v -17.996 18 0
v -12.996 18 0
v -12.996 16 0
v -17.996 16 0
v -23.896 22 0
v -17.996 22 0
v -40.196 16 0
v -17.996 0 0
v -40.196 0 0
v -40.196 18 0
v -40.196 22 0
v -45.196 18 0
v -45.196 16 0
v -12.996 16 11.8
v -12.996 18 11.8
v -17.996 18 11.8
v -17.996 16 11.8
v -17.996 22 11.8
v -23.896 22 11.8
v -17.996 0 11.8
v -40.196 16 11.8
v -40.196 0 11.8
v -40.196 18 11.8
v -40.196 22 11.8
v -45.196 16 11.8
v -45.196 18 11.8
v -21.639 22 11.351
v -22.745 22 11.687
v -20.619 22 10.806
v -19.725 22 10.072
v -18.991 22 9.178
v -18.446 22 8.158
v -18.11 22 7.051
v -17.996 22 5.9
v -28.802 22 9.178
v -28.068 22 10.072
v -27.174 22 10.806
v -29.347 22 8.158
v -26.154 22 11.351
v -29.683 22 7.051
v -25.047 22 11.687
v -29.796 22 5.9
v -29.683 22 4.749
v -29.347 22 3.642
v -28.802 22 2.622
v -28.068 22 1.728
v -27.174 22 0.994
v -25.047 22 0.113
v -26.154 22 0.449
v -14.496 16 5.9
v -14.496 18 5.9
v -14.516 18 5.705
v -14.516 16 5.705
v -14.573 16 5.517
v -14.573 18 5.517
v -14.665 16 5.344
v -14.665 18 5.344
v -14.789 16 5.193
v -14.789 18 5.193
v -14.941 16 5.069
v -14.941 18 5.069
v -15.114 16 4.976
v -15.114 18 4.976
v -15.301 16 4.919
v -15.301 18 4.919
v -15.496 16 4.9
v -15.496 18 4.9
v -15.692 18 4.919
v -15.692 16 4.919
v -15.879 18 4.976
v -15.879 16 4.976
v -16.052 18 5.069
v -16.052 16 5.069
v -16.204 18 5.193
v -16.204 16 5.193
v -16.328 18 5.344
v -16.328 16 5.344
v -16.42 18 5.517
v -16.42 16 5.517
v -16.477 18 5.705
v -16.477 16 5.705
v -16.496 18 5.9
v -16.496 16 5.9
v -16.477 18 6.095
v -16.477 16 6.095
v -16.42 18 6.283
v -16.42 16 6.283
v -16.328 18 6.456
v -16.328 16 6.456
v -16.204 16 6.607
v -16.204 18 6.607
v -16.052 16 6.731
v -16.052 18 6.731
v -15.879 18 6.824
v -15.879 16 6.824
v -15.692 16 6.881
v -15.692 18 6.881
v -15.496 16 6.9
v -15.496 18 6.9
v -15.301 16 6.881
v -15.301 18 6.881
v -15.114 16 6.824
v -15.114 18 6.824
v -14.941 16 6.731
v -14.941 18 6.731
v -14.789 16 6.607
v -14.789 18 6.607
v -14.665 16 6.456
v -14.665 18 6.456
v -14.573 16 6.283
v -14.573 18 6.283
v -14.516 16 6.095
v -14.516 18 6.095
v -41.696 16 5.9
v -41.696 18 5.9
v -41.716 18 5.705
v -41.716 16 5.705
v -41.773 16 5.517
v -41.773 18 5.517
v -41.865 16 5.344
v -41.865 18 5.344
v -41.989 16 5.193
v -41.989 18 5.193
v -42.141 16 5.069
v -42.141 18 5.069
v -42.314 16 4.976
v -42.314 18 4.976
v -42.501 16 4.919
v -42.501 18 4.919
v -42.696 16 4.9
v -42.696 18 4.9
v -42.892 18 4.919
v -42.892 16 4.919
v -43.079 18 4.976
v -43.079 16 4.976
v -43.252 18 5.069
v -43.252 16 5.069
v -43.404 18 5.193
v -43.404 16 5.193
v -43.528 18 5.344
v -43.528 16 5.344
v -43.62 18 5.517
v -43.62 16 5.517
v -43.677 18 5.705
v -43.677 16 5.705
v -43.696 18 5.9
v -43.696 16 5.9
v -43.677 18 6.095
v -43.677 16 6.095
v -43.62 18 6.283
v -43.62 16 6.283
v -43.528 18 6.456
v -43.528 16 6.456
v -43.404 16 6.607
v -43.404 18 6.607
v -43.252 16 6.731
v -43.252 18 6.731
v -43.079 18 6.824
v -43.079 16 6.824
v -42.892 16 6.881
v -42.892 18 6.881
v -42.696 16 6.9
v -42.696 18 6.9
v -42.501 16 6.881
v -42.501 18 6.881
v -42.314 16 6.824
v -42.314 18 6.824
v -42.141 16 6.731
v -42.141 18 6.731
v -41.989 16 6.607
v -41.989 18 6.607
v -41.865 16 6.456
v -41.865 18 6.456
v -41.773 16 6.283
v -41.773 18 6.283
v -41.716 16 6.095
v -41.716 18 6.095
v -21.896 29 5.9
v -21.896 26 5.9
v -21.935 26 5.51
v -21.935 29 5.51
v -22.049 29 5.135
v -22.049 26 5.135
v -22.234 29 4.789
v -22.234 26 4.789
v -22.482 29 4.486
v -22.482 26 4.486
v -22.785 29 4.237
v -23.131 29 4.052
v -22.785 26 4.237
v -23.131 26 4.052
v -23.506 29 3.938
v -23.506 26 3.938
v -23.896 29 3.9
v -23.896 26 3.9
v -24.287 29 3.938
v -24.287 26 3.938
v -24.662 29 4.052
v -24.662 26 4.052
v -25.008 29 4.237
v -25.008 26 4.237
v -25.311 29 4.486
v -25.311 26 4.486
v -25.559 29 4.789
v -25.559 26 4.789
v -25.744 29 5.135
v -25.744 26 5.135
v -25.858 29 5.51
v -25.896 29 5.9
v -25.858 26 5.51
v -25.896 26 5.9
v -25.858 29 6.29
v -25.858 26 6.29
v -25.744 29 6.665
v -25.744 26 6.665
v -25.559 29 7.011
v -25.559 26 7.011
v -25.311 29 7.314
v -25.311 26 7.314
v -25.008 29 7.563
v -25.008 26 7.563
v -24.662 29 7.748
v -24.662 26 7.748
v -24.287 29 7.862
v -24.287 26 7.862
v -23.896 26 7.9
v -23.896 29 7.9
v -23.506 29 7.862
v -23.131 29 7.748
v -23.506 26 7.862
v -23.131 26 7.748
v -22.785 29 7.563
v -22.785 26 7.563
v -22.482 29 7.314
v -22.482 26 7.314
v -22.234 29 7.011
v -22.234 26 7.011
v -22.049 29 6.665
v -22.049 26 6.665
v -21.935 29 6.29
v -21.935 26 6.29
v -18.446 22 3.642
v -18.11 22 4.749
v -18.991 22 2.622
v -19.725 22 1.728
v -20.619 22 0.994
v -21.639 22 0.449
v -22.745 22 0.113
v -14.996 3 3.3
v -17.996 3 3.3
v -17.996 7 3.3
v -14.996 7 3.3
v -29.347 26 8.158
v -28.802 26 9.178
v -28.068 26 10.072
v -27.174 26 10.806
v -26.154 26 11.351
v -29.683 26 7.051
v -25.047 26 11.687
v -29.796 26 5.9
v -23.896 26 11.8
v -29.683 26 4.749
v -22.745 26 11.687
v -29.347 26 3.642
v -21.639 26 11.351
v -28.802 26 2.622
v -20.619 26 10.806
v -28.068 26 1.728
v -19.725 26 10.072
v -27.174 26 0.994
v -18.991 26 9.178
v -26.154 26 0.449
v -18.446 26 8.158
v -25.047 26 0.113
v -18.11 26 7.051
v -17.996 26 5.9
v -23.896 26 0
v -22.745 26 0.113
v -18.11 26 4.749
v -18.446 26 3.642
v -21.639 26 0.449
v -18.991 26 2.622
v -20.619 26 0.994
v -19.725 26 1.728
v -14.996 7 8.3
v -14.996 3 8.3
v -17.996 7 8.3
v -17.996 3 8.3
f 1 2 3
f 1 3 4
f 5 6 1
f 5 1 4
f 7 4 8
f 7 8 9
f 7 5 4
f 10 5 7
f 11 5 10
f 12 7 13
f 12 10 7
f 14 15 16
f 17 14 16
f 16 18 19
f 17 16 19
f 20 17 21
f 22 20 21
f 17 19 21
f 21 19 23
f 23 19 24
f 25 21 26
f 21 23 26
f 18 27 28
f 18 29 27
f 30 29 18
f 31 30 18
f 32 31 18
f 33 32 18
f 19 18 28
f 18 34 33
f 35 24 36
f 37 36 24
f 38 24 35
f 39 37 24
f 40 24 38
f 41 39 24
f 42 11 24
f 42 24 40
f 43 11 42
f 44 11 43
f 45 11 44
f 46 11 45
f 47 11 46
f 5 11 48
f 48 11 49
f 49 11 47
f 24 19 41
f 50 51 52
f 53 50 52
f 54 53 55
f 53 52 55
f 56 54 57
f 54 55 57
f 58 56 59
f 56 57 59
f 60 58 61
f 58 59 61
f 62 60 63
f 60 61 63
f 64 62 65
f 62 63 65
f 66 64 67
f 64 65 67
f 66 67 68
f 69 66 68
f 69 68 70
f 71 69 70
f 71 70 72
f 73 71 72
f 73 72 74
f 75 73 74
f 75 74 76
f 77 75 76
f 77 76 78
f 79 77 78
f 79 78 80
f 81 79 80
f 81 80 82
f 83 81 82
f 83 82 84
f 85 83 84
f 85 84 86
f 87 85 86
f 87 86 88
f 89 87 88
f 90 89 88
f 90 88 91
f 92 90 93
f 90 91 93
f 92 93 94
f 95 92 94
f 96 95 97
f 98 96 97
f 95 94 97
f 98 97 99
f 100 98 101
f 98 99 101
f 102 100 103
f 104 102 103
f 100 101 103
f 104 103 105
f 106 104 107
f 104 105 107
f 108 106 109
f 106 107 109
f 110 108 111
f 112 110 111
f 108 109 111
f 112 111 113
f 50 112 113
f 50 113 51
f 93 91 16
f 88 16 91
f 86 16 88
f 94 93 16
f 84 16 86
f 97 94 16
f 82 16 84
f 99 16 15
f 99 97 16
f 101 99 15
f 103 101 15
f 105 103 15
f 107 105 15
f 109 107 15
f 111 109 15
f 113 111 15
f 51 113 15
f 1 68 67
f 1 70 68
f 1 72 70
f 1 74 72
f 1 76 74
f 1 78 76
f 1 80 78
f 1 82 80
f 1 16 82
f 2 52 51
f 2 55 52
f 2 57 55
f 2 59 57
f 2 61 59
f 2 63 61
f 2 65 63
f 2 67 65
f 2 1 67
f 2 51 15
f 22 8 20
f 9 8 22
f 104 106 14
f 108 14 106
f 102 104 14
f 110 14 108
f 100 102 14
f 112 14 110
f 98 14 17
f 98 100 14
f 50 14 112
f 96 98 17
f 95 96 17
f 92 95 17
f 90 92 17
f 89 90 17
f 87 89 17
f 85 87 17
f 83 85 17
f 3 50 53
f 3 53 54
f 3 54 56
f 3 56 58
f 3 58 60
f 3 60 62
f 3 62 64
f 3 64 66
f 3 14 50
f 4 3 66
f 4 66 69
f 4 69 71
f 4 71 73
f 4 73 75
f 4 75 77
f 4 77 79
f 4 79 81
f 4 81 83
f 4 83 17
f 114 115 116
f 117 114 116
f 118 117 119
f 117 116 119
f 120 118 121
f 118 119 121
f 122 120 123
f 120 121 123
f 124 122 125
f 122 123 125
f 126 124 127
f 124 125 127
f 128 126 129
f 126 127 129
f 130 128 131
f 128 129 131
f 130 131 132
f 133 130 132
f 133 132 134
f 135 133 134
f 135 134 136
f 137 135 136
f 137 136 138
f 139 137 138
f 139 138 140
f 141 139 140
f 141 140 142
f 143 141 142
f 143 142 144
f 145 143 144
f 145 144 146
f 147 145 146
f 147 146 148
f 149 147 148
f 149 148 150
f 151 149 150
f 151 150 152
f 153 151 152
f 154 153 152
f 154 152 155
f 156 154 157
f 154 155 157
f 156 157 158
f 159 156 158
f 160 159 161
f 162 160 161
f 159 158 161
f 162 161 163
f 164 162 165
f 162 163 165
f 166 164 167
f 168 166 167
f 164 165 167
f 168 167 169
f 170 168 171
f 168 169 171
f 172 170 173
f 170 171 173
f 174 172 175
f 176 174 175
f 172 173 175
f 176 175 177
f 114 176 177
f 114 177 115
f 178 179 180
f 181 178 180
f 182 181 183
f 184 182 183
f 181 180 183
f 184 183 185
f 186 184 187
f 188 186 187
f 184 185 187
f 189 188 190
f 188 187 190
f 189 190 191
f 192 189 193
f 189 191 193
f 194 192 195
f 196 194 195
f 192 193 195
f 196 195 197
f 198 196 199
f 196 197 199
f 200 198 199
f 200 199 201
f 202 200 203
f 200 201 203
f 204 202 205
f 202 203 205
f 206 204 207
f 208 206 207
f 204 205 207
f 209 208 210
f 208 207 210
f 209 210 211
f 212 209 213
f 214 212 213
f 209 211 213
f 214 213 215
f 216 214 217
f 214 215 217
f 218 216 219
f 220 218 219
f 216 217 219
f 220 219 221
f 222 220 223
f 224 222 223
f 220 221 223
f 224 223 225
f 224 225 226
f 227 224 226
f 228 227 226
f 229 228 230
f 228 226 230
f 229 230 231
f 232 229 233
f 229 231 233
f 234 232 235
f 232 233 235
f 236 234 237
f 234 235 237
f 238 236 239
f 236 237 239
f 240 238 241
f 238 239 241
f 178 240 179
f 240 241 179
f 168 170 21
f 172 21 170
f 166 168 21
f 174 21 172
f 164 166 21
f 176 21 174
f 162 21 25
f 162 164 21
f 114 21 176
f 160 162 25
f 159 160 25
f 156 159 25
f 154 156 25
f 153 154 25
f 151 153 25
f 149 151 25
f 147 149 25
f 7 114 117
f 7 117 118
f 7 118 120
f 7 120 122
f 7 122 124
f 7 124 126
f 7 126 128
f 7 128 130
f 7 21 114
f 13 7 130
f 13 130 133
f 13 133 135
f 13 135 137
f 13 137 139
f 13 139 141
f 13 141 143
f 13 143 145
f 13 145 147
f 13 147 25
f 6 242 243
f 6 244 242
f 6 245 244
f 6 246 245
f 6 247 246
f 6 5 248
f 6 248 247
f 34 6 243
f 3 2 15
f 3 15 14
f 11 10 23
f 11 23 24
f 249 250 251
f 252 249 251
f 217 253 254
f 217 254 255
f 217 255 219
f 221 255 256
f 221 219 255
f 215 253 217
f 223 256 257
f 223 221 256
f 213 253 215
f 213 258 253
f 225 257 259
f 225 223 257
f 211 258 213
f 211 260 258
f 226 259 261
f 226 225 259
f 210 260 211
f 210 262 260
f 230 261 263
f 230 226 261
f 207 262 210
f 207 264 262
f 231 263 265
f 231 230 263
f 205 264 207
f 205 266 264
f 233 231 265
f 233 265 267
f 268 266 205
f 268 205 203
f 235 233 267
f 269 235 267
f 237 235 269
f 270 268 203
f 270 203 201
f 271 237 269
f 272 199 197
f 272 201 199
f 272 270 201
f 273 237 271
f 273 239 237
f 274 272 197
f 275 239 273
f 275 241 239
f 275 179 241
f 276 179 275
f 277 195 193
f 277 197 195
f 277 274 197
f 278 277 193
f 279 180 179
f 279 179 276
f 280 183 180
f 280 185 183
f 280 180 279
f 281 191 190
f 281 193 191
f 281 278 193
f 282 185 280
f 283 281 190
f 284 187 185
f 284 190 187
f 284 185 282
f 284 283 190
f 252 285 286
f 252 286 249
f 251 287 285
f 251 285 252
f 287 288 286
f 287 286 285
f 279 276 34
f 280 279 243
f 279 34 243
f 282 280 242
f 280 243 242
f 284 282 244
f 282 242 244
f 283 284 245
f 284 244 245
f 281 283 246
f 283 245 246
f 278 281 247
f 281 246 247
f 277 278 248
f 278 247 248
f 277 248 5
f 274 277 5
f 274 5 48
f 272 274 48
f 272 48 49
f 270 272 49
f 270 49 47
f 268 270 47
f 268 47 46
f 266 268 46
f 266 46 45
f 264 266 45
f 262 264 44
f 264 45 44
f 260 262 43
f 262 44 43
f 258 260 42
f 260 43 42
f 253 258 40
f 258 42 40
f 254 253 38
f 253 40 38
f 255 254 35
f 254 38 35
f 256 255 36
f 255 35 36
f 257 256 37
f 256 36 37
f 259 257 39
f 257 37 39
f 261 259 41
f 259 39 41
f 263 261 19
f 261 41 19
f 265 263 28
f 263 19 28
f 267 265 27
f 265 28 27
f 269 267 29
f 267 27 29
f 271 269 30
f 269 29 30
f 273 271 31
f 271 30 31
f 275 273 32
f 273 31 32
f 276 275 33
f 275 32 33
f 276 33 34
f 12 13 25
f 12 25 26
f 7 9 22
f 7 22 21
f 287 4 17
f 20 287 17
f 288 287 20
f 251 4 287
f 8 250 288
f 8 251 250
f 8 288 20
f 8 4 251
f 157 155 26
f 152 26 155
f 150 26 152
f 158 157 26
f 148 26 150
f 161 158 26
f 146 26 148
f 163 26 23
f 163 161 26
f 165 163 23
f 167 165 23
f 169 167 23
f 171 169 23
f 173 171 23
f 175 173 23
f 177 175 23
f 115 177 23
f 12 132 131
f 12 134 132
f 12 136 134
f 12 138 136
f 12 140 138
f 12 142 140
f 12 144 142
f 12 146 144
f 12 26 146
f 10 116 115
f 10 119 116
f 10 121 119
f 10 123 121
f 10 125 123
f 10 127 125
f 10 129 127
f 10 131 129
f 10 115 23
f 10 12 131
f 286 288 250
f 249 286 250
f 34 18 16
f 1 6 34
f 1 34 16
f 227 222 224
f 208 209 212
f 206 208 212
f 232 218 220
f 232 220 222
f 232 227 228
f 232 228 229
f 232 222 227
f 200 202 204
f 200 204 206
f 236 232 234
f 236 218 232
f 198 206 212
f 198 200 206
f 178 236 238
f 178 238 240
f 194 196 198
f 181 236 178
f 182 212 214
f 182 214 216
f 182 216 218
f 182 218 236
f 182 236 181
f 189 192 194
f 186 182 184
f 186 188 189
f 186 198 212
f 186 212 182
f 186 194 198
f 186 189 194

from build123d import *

# Parameters (mm, degrees)
BOSS_EXTRU_1_DEPTH      = 11.8
ESQUISSE2_R             = 1
ENL_V_MAT_EXTRU_1_DEPTH = 11.8
ESQUISSE3_R             = 5.9
BOSS_EXTRU_2_DEPTH      = 4
ESQUISSE4_R             = 2
BOSS_EXTRU_3_DEPTH      = 3
ESQUISSE5_W             = 5
ESQUISSE5_H             = 4
BOSS_EXTRU_4_DEPTH      = 3


with BuildPart() as part:
    # Esquisse1 → Boss.-Extru.1 (new body)
    with BuildSketch(Plane.XY):
        Polygon((-45.196459949, 18), (-40.196459949, 18), (-40.196459949, 22), (-17.996459949, 22), (-17.996459949, 18), (-12.996459949, 18), (-12.996459949, 16), (-17.996459949, 16), (-17.996459949, 0), (-40.196459949, 0), (-40.196459949, 16), (-45.196459949, 16), align=None)
    extrude(amount=BOSS_EXTRU_1_DEPTH)

    # Esquisse2 → Enlèv. mat.-Extru.1 (cut)
    with BuildSketch(Plane(origin=(0, 18, 0), x_dir=(1, 0, 0), z_dir=(0, 1, 0))):
        with Locations((-42.696459949, -5.9)):
            Circle(ESQUISSE2_R)
        with Locations((-15.496459949, -5.9)):
            Circle(ESQUISSE2_R)
    extrude(amount=-ENL_V_MAT_EXTRU_1_DEPTH, mode=Mode.SUBTRACT)

    # Esquisse3 → Boss.-Extru.2 (add)
    with BuildSketch(Plane(origin=(0, 22, 0), x_dir=(1, 0, 0), z_dir=(0, 1, 0))):
        with Locations((-23.896459949, -5.9)):
            Circle(ESQUISSE3_R)
    extrude(amount=BOSS_EXTRU_2_DEPTH)

    # Esquisse4 → Boss.-Extru.3 (add)
    with BuildSketch(Plane(origin=(0, 26, 0), x_dir=(1, 0, 0), z_dir=(0, 1, 0))):
        with Locations((-23.896459949, -5.9)):
            Circle(ESQUISSE4_R)
    extrude(amount=BOSS_EXTRU_3_DEPTH)

    # Esquisse5 → Boss.-Extru.4 (add)
    with BuildSketch(Plane(origin=(-17.996459949, 0, 0), x_dir=(0, 0, -1), z_dir=(1, 0, 0))):
        with Locations((-5.8, 5)):
            Rectangle(ESQUISSE5_W, ESQUISSE5_H)
    extrude(amount=BOSS_EXTRU_4_DEPTH)


solid = part.part
